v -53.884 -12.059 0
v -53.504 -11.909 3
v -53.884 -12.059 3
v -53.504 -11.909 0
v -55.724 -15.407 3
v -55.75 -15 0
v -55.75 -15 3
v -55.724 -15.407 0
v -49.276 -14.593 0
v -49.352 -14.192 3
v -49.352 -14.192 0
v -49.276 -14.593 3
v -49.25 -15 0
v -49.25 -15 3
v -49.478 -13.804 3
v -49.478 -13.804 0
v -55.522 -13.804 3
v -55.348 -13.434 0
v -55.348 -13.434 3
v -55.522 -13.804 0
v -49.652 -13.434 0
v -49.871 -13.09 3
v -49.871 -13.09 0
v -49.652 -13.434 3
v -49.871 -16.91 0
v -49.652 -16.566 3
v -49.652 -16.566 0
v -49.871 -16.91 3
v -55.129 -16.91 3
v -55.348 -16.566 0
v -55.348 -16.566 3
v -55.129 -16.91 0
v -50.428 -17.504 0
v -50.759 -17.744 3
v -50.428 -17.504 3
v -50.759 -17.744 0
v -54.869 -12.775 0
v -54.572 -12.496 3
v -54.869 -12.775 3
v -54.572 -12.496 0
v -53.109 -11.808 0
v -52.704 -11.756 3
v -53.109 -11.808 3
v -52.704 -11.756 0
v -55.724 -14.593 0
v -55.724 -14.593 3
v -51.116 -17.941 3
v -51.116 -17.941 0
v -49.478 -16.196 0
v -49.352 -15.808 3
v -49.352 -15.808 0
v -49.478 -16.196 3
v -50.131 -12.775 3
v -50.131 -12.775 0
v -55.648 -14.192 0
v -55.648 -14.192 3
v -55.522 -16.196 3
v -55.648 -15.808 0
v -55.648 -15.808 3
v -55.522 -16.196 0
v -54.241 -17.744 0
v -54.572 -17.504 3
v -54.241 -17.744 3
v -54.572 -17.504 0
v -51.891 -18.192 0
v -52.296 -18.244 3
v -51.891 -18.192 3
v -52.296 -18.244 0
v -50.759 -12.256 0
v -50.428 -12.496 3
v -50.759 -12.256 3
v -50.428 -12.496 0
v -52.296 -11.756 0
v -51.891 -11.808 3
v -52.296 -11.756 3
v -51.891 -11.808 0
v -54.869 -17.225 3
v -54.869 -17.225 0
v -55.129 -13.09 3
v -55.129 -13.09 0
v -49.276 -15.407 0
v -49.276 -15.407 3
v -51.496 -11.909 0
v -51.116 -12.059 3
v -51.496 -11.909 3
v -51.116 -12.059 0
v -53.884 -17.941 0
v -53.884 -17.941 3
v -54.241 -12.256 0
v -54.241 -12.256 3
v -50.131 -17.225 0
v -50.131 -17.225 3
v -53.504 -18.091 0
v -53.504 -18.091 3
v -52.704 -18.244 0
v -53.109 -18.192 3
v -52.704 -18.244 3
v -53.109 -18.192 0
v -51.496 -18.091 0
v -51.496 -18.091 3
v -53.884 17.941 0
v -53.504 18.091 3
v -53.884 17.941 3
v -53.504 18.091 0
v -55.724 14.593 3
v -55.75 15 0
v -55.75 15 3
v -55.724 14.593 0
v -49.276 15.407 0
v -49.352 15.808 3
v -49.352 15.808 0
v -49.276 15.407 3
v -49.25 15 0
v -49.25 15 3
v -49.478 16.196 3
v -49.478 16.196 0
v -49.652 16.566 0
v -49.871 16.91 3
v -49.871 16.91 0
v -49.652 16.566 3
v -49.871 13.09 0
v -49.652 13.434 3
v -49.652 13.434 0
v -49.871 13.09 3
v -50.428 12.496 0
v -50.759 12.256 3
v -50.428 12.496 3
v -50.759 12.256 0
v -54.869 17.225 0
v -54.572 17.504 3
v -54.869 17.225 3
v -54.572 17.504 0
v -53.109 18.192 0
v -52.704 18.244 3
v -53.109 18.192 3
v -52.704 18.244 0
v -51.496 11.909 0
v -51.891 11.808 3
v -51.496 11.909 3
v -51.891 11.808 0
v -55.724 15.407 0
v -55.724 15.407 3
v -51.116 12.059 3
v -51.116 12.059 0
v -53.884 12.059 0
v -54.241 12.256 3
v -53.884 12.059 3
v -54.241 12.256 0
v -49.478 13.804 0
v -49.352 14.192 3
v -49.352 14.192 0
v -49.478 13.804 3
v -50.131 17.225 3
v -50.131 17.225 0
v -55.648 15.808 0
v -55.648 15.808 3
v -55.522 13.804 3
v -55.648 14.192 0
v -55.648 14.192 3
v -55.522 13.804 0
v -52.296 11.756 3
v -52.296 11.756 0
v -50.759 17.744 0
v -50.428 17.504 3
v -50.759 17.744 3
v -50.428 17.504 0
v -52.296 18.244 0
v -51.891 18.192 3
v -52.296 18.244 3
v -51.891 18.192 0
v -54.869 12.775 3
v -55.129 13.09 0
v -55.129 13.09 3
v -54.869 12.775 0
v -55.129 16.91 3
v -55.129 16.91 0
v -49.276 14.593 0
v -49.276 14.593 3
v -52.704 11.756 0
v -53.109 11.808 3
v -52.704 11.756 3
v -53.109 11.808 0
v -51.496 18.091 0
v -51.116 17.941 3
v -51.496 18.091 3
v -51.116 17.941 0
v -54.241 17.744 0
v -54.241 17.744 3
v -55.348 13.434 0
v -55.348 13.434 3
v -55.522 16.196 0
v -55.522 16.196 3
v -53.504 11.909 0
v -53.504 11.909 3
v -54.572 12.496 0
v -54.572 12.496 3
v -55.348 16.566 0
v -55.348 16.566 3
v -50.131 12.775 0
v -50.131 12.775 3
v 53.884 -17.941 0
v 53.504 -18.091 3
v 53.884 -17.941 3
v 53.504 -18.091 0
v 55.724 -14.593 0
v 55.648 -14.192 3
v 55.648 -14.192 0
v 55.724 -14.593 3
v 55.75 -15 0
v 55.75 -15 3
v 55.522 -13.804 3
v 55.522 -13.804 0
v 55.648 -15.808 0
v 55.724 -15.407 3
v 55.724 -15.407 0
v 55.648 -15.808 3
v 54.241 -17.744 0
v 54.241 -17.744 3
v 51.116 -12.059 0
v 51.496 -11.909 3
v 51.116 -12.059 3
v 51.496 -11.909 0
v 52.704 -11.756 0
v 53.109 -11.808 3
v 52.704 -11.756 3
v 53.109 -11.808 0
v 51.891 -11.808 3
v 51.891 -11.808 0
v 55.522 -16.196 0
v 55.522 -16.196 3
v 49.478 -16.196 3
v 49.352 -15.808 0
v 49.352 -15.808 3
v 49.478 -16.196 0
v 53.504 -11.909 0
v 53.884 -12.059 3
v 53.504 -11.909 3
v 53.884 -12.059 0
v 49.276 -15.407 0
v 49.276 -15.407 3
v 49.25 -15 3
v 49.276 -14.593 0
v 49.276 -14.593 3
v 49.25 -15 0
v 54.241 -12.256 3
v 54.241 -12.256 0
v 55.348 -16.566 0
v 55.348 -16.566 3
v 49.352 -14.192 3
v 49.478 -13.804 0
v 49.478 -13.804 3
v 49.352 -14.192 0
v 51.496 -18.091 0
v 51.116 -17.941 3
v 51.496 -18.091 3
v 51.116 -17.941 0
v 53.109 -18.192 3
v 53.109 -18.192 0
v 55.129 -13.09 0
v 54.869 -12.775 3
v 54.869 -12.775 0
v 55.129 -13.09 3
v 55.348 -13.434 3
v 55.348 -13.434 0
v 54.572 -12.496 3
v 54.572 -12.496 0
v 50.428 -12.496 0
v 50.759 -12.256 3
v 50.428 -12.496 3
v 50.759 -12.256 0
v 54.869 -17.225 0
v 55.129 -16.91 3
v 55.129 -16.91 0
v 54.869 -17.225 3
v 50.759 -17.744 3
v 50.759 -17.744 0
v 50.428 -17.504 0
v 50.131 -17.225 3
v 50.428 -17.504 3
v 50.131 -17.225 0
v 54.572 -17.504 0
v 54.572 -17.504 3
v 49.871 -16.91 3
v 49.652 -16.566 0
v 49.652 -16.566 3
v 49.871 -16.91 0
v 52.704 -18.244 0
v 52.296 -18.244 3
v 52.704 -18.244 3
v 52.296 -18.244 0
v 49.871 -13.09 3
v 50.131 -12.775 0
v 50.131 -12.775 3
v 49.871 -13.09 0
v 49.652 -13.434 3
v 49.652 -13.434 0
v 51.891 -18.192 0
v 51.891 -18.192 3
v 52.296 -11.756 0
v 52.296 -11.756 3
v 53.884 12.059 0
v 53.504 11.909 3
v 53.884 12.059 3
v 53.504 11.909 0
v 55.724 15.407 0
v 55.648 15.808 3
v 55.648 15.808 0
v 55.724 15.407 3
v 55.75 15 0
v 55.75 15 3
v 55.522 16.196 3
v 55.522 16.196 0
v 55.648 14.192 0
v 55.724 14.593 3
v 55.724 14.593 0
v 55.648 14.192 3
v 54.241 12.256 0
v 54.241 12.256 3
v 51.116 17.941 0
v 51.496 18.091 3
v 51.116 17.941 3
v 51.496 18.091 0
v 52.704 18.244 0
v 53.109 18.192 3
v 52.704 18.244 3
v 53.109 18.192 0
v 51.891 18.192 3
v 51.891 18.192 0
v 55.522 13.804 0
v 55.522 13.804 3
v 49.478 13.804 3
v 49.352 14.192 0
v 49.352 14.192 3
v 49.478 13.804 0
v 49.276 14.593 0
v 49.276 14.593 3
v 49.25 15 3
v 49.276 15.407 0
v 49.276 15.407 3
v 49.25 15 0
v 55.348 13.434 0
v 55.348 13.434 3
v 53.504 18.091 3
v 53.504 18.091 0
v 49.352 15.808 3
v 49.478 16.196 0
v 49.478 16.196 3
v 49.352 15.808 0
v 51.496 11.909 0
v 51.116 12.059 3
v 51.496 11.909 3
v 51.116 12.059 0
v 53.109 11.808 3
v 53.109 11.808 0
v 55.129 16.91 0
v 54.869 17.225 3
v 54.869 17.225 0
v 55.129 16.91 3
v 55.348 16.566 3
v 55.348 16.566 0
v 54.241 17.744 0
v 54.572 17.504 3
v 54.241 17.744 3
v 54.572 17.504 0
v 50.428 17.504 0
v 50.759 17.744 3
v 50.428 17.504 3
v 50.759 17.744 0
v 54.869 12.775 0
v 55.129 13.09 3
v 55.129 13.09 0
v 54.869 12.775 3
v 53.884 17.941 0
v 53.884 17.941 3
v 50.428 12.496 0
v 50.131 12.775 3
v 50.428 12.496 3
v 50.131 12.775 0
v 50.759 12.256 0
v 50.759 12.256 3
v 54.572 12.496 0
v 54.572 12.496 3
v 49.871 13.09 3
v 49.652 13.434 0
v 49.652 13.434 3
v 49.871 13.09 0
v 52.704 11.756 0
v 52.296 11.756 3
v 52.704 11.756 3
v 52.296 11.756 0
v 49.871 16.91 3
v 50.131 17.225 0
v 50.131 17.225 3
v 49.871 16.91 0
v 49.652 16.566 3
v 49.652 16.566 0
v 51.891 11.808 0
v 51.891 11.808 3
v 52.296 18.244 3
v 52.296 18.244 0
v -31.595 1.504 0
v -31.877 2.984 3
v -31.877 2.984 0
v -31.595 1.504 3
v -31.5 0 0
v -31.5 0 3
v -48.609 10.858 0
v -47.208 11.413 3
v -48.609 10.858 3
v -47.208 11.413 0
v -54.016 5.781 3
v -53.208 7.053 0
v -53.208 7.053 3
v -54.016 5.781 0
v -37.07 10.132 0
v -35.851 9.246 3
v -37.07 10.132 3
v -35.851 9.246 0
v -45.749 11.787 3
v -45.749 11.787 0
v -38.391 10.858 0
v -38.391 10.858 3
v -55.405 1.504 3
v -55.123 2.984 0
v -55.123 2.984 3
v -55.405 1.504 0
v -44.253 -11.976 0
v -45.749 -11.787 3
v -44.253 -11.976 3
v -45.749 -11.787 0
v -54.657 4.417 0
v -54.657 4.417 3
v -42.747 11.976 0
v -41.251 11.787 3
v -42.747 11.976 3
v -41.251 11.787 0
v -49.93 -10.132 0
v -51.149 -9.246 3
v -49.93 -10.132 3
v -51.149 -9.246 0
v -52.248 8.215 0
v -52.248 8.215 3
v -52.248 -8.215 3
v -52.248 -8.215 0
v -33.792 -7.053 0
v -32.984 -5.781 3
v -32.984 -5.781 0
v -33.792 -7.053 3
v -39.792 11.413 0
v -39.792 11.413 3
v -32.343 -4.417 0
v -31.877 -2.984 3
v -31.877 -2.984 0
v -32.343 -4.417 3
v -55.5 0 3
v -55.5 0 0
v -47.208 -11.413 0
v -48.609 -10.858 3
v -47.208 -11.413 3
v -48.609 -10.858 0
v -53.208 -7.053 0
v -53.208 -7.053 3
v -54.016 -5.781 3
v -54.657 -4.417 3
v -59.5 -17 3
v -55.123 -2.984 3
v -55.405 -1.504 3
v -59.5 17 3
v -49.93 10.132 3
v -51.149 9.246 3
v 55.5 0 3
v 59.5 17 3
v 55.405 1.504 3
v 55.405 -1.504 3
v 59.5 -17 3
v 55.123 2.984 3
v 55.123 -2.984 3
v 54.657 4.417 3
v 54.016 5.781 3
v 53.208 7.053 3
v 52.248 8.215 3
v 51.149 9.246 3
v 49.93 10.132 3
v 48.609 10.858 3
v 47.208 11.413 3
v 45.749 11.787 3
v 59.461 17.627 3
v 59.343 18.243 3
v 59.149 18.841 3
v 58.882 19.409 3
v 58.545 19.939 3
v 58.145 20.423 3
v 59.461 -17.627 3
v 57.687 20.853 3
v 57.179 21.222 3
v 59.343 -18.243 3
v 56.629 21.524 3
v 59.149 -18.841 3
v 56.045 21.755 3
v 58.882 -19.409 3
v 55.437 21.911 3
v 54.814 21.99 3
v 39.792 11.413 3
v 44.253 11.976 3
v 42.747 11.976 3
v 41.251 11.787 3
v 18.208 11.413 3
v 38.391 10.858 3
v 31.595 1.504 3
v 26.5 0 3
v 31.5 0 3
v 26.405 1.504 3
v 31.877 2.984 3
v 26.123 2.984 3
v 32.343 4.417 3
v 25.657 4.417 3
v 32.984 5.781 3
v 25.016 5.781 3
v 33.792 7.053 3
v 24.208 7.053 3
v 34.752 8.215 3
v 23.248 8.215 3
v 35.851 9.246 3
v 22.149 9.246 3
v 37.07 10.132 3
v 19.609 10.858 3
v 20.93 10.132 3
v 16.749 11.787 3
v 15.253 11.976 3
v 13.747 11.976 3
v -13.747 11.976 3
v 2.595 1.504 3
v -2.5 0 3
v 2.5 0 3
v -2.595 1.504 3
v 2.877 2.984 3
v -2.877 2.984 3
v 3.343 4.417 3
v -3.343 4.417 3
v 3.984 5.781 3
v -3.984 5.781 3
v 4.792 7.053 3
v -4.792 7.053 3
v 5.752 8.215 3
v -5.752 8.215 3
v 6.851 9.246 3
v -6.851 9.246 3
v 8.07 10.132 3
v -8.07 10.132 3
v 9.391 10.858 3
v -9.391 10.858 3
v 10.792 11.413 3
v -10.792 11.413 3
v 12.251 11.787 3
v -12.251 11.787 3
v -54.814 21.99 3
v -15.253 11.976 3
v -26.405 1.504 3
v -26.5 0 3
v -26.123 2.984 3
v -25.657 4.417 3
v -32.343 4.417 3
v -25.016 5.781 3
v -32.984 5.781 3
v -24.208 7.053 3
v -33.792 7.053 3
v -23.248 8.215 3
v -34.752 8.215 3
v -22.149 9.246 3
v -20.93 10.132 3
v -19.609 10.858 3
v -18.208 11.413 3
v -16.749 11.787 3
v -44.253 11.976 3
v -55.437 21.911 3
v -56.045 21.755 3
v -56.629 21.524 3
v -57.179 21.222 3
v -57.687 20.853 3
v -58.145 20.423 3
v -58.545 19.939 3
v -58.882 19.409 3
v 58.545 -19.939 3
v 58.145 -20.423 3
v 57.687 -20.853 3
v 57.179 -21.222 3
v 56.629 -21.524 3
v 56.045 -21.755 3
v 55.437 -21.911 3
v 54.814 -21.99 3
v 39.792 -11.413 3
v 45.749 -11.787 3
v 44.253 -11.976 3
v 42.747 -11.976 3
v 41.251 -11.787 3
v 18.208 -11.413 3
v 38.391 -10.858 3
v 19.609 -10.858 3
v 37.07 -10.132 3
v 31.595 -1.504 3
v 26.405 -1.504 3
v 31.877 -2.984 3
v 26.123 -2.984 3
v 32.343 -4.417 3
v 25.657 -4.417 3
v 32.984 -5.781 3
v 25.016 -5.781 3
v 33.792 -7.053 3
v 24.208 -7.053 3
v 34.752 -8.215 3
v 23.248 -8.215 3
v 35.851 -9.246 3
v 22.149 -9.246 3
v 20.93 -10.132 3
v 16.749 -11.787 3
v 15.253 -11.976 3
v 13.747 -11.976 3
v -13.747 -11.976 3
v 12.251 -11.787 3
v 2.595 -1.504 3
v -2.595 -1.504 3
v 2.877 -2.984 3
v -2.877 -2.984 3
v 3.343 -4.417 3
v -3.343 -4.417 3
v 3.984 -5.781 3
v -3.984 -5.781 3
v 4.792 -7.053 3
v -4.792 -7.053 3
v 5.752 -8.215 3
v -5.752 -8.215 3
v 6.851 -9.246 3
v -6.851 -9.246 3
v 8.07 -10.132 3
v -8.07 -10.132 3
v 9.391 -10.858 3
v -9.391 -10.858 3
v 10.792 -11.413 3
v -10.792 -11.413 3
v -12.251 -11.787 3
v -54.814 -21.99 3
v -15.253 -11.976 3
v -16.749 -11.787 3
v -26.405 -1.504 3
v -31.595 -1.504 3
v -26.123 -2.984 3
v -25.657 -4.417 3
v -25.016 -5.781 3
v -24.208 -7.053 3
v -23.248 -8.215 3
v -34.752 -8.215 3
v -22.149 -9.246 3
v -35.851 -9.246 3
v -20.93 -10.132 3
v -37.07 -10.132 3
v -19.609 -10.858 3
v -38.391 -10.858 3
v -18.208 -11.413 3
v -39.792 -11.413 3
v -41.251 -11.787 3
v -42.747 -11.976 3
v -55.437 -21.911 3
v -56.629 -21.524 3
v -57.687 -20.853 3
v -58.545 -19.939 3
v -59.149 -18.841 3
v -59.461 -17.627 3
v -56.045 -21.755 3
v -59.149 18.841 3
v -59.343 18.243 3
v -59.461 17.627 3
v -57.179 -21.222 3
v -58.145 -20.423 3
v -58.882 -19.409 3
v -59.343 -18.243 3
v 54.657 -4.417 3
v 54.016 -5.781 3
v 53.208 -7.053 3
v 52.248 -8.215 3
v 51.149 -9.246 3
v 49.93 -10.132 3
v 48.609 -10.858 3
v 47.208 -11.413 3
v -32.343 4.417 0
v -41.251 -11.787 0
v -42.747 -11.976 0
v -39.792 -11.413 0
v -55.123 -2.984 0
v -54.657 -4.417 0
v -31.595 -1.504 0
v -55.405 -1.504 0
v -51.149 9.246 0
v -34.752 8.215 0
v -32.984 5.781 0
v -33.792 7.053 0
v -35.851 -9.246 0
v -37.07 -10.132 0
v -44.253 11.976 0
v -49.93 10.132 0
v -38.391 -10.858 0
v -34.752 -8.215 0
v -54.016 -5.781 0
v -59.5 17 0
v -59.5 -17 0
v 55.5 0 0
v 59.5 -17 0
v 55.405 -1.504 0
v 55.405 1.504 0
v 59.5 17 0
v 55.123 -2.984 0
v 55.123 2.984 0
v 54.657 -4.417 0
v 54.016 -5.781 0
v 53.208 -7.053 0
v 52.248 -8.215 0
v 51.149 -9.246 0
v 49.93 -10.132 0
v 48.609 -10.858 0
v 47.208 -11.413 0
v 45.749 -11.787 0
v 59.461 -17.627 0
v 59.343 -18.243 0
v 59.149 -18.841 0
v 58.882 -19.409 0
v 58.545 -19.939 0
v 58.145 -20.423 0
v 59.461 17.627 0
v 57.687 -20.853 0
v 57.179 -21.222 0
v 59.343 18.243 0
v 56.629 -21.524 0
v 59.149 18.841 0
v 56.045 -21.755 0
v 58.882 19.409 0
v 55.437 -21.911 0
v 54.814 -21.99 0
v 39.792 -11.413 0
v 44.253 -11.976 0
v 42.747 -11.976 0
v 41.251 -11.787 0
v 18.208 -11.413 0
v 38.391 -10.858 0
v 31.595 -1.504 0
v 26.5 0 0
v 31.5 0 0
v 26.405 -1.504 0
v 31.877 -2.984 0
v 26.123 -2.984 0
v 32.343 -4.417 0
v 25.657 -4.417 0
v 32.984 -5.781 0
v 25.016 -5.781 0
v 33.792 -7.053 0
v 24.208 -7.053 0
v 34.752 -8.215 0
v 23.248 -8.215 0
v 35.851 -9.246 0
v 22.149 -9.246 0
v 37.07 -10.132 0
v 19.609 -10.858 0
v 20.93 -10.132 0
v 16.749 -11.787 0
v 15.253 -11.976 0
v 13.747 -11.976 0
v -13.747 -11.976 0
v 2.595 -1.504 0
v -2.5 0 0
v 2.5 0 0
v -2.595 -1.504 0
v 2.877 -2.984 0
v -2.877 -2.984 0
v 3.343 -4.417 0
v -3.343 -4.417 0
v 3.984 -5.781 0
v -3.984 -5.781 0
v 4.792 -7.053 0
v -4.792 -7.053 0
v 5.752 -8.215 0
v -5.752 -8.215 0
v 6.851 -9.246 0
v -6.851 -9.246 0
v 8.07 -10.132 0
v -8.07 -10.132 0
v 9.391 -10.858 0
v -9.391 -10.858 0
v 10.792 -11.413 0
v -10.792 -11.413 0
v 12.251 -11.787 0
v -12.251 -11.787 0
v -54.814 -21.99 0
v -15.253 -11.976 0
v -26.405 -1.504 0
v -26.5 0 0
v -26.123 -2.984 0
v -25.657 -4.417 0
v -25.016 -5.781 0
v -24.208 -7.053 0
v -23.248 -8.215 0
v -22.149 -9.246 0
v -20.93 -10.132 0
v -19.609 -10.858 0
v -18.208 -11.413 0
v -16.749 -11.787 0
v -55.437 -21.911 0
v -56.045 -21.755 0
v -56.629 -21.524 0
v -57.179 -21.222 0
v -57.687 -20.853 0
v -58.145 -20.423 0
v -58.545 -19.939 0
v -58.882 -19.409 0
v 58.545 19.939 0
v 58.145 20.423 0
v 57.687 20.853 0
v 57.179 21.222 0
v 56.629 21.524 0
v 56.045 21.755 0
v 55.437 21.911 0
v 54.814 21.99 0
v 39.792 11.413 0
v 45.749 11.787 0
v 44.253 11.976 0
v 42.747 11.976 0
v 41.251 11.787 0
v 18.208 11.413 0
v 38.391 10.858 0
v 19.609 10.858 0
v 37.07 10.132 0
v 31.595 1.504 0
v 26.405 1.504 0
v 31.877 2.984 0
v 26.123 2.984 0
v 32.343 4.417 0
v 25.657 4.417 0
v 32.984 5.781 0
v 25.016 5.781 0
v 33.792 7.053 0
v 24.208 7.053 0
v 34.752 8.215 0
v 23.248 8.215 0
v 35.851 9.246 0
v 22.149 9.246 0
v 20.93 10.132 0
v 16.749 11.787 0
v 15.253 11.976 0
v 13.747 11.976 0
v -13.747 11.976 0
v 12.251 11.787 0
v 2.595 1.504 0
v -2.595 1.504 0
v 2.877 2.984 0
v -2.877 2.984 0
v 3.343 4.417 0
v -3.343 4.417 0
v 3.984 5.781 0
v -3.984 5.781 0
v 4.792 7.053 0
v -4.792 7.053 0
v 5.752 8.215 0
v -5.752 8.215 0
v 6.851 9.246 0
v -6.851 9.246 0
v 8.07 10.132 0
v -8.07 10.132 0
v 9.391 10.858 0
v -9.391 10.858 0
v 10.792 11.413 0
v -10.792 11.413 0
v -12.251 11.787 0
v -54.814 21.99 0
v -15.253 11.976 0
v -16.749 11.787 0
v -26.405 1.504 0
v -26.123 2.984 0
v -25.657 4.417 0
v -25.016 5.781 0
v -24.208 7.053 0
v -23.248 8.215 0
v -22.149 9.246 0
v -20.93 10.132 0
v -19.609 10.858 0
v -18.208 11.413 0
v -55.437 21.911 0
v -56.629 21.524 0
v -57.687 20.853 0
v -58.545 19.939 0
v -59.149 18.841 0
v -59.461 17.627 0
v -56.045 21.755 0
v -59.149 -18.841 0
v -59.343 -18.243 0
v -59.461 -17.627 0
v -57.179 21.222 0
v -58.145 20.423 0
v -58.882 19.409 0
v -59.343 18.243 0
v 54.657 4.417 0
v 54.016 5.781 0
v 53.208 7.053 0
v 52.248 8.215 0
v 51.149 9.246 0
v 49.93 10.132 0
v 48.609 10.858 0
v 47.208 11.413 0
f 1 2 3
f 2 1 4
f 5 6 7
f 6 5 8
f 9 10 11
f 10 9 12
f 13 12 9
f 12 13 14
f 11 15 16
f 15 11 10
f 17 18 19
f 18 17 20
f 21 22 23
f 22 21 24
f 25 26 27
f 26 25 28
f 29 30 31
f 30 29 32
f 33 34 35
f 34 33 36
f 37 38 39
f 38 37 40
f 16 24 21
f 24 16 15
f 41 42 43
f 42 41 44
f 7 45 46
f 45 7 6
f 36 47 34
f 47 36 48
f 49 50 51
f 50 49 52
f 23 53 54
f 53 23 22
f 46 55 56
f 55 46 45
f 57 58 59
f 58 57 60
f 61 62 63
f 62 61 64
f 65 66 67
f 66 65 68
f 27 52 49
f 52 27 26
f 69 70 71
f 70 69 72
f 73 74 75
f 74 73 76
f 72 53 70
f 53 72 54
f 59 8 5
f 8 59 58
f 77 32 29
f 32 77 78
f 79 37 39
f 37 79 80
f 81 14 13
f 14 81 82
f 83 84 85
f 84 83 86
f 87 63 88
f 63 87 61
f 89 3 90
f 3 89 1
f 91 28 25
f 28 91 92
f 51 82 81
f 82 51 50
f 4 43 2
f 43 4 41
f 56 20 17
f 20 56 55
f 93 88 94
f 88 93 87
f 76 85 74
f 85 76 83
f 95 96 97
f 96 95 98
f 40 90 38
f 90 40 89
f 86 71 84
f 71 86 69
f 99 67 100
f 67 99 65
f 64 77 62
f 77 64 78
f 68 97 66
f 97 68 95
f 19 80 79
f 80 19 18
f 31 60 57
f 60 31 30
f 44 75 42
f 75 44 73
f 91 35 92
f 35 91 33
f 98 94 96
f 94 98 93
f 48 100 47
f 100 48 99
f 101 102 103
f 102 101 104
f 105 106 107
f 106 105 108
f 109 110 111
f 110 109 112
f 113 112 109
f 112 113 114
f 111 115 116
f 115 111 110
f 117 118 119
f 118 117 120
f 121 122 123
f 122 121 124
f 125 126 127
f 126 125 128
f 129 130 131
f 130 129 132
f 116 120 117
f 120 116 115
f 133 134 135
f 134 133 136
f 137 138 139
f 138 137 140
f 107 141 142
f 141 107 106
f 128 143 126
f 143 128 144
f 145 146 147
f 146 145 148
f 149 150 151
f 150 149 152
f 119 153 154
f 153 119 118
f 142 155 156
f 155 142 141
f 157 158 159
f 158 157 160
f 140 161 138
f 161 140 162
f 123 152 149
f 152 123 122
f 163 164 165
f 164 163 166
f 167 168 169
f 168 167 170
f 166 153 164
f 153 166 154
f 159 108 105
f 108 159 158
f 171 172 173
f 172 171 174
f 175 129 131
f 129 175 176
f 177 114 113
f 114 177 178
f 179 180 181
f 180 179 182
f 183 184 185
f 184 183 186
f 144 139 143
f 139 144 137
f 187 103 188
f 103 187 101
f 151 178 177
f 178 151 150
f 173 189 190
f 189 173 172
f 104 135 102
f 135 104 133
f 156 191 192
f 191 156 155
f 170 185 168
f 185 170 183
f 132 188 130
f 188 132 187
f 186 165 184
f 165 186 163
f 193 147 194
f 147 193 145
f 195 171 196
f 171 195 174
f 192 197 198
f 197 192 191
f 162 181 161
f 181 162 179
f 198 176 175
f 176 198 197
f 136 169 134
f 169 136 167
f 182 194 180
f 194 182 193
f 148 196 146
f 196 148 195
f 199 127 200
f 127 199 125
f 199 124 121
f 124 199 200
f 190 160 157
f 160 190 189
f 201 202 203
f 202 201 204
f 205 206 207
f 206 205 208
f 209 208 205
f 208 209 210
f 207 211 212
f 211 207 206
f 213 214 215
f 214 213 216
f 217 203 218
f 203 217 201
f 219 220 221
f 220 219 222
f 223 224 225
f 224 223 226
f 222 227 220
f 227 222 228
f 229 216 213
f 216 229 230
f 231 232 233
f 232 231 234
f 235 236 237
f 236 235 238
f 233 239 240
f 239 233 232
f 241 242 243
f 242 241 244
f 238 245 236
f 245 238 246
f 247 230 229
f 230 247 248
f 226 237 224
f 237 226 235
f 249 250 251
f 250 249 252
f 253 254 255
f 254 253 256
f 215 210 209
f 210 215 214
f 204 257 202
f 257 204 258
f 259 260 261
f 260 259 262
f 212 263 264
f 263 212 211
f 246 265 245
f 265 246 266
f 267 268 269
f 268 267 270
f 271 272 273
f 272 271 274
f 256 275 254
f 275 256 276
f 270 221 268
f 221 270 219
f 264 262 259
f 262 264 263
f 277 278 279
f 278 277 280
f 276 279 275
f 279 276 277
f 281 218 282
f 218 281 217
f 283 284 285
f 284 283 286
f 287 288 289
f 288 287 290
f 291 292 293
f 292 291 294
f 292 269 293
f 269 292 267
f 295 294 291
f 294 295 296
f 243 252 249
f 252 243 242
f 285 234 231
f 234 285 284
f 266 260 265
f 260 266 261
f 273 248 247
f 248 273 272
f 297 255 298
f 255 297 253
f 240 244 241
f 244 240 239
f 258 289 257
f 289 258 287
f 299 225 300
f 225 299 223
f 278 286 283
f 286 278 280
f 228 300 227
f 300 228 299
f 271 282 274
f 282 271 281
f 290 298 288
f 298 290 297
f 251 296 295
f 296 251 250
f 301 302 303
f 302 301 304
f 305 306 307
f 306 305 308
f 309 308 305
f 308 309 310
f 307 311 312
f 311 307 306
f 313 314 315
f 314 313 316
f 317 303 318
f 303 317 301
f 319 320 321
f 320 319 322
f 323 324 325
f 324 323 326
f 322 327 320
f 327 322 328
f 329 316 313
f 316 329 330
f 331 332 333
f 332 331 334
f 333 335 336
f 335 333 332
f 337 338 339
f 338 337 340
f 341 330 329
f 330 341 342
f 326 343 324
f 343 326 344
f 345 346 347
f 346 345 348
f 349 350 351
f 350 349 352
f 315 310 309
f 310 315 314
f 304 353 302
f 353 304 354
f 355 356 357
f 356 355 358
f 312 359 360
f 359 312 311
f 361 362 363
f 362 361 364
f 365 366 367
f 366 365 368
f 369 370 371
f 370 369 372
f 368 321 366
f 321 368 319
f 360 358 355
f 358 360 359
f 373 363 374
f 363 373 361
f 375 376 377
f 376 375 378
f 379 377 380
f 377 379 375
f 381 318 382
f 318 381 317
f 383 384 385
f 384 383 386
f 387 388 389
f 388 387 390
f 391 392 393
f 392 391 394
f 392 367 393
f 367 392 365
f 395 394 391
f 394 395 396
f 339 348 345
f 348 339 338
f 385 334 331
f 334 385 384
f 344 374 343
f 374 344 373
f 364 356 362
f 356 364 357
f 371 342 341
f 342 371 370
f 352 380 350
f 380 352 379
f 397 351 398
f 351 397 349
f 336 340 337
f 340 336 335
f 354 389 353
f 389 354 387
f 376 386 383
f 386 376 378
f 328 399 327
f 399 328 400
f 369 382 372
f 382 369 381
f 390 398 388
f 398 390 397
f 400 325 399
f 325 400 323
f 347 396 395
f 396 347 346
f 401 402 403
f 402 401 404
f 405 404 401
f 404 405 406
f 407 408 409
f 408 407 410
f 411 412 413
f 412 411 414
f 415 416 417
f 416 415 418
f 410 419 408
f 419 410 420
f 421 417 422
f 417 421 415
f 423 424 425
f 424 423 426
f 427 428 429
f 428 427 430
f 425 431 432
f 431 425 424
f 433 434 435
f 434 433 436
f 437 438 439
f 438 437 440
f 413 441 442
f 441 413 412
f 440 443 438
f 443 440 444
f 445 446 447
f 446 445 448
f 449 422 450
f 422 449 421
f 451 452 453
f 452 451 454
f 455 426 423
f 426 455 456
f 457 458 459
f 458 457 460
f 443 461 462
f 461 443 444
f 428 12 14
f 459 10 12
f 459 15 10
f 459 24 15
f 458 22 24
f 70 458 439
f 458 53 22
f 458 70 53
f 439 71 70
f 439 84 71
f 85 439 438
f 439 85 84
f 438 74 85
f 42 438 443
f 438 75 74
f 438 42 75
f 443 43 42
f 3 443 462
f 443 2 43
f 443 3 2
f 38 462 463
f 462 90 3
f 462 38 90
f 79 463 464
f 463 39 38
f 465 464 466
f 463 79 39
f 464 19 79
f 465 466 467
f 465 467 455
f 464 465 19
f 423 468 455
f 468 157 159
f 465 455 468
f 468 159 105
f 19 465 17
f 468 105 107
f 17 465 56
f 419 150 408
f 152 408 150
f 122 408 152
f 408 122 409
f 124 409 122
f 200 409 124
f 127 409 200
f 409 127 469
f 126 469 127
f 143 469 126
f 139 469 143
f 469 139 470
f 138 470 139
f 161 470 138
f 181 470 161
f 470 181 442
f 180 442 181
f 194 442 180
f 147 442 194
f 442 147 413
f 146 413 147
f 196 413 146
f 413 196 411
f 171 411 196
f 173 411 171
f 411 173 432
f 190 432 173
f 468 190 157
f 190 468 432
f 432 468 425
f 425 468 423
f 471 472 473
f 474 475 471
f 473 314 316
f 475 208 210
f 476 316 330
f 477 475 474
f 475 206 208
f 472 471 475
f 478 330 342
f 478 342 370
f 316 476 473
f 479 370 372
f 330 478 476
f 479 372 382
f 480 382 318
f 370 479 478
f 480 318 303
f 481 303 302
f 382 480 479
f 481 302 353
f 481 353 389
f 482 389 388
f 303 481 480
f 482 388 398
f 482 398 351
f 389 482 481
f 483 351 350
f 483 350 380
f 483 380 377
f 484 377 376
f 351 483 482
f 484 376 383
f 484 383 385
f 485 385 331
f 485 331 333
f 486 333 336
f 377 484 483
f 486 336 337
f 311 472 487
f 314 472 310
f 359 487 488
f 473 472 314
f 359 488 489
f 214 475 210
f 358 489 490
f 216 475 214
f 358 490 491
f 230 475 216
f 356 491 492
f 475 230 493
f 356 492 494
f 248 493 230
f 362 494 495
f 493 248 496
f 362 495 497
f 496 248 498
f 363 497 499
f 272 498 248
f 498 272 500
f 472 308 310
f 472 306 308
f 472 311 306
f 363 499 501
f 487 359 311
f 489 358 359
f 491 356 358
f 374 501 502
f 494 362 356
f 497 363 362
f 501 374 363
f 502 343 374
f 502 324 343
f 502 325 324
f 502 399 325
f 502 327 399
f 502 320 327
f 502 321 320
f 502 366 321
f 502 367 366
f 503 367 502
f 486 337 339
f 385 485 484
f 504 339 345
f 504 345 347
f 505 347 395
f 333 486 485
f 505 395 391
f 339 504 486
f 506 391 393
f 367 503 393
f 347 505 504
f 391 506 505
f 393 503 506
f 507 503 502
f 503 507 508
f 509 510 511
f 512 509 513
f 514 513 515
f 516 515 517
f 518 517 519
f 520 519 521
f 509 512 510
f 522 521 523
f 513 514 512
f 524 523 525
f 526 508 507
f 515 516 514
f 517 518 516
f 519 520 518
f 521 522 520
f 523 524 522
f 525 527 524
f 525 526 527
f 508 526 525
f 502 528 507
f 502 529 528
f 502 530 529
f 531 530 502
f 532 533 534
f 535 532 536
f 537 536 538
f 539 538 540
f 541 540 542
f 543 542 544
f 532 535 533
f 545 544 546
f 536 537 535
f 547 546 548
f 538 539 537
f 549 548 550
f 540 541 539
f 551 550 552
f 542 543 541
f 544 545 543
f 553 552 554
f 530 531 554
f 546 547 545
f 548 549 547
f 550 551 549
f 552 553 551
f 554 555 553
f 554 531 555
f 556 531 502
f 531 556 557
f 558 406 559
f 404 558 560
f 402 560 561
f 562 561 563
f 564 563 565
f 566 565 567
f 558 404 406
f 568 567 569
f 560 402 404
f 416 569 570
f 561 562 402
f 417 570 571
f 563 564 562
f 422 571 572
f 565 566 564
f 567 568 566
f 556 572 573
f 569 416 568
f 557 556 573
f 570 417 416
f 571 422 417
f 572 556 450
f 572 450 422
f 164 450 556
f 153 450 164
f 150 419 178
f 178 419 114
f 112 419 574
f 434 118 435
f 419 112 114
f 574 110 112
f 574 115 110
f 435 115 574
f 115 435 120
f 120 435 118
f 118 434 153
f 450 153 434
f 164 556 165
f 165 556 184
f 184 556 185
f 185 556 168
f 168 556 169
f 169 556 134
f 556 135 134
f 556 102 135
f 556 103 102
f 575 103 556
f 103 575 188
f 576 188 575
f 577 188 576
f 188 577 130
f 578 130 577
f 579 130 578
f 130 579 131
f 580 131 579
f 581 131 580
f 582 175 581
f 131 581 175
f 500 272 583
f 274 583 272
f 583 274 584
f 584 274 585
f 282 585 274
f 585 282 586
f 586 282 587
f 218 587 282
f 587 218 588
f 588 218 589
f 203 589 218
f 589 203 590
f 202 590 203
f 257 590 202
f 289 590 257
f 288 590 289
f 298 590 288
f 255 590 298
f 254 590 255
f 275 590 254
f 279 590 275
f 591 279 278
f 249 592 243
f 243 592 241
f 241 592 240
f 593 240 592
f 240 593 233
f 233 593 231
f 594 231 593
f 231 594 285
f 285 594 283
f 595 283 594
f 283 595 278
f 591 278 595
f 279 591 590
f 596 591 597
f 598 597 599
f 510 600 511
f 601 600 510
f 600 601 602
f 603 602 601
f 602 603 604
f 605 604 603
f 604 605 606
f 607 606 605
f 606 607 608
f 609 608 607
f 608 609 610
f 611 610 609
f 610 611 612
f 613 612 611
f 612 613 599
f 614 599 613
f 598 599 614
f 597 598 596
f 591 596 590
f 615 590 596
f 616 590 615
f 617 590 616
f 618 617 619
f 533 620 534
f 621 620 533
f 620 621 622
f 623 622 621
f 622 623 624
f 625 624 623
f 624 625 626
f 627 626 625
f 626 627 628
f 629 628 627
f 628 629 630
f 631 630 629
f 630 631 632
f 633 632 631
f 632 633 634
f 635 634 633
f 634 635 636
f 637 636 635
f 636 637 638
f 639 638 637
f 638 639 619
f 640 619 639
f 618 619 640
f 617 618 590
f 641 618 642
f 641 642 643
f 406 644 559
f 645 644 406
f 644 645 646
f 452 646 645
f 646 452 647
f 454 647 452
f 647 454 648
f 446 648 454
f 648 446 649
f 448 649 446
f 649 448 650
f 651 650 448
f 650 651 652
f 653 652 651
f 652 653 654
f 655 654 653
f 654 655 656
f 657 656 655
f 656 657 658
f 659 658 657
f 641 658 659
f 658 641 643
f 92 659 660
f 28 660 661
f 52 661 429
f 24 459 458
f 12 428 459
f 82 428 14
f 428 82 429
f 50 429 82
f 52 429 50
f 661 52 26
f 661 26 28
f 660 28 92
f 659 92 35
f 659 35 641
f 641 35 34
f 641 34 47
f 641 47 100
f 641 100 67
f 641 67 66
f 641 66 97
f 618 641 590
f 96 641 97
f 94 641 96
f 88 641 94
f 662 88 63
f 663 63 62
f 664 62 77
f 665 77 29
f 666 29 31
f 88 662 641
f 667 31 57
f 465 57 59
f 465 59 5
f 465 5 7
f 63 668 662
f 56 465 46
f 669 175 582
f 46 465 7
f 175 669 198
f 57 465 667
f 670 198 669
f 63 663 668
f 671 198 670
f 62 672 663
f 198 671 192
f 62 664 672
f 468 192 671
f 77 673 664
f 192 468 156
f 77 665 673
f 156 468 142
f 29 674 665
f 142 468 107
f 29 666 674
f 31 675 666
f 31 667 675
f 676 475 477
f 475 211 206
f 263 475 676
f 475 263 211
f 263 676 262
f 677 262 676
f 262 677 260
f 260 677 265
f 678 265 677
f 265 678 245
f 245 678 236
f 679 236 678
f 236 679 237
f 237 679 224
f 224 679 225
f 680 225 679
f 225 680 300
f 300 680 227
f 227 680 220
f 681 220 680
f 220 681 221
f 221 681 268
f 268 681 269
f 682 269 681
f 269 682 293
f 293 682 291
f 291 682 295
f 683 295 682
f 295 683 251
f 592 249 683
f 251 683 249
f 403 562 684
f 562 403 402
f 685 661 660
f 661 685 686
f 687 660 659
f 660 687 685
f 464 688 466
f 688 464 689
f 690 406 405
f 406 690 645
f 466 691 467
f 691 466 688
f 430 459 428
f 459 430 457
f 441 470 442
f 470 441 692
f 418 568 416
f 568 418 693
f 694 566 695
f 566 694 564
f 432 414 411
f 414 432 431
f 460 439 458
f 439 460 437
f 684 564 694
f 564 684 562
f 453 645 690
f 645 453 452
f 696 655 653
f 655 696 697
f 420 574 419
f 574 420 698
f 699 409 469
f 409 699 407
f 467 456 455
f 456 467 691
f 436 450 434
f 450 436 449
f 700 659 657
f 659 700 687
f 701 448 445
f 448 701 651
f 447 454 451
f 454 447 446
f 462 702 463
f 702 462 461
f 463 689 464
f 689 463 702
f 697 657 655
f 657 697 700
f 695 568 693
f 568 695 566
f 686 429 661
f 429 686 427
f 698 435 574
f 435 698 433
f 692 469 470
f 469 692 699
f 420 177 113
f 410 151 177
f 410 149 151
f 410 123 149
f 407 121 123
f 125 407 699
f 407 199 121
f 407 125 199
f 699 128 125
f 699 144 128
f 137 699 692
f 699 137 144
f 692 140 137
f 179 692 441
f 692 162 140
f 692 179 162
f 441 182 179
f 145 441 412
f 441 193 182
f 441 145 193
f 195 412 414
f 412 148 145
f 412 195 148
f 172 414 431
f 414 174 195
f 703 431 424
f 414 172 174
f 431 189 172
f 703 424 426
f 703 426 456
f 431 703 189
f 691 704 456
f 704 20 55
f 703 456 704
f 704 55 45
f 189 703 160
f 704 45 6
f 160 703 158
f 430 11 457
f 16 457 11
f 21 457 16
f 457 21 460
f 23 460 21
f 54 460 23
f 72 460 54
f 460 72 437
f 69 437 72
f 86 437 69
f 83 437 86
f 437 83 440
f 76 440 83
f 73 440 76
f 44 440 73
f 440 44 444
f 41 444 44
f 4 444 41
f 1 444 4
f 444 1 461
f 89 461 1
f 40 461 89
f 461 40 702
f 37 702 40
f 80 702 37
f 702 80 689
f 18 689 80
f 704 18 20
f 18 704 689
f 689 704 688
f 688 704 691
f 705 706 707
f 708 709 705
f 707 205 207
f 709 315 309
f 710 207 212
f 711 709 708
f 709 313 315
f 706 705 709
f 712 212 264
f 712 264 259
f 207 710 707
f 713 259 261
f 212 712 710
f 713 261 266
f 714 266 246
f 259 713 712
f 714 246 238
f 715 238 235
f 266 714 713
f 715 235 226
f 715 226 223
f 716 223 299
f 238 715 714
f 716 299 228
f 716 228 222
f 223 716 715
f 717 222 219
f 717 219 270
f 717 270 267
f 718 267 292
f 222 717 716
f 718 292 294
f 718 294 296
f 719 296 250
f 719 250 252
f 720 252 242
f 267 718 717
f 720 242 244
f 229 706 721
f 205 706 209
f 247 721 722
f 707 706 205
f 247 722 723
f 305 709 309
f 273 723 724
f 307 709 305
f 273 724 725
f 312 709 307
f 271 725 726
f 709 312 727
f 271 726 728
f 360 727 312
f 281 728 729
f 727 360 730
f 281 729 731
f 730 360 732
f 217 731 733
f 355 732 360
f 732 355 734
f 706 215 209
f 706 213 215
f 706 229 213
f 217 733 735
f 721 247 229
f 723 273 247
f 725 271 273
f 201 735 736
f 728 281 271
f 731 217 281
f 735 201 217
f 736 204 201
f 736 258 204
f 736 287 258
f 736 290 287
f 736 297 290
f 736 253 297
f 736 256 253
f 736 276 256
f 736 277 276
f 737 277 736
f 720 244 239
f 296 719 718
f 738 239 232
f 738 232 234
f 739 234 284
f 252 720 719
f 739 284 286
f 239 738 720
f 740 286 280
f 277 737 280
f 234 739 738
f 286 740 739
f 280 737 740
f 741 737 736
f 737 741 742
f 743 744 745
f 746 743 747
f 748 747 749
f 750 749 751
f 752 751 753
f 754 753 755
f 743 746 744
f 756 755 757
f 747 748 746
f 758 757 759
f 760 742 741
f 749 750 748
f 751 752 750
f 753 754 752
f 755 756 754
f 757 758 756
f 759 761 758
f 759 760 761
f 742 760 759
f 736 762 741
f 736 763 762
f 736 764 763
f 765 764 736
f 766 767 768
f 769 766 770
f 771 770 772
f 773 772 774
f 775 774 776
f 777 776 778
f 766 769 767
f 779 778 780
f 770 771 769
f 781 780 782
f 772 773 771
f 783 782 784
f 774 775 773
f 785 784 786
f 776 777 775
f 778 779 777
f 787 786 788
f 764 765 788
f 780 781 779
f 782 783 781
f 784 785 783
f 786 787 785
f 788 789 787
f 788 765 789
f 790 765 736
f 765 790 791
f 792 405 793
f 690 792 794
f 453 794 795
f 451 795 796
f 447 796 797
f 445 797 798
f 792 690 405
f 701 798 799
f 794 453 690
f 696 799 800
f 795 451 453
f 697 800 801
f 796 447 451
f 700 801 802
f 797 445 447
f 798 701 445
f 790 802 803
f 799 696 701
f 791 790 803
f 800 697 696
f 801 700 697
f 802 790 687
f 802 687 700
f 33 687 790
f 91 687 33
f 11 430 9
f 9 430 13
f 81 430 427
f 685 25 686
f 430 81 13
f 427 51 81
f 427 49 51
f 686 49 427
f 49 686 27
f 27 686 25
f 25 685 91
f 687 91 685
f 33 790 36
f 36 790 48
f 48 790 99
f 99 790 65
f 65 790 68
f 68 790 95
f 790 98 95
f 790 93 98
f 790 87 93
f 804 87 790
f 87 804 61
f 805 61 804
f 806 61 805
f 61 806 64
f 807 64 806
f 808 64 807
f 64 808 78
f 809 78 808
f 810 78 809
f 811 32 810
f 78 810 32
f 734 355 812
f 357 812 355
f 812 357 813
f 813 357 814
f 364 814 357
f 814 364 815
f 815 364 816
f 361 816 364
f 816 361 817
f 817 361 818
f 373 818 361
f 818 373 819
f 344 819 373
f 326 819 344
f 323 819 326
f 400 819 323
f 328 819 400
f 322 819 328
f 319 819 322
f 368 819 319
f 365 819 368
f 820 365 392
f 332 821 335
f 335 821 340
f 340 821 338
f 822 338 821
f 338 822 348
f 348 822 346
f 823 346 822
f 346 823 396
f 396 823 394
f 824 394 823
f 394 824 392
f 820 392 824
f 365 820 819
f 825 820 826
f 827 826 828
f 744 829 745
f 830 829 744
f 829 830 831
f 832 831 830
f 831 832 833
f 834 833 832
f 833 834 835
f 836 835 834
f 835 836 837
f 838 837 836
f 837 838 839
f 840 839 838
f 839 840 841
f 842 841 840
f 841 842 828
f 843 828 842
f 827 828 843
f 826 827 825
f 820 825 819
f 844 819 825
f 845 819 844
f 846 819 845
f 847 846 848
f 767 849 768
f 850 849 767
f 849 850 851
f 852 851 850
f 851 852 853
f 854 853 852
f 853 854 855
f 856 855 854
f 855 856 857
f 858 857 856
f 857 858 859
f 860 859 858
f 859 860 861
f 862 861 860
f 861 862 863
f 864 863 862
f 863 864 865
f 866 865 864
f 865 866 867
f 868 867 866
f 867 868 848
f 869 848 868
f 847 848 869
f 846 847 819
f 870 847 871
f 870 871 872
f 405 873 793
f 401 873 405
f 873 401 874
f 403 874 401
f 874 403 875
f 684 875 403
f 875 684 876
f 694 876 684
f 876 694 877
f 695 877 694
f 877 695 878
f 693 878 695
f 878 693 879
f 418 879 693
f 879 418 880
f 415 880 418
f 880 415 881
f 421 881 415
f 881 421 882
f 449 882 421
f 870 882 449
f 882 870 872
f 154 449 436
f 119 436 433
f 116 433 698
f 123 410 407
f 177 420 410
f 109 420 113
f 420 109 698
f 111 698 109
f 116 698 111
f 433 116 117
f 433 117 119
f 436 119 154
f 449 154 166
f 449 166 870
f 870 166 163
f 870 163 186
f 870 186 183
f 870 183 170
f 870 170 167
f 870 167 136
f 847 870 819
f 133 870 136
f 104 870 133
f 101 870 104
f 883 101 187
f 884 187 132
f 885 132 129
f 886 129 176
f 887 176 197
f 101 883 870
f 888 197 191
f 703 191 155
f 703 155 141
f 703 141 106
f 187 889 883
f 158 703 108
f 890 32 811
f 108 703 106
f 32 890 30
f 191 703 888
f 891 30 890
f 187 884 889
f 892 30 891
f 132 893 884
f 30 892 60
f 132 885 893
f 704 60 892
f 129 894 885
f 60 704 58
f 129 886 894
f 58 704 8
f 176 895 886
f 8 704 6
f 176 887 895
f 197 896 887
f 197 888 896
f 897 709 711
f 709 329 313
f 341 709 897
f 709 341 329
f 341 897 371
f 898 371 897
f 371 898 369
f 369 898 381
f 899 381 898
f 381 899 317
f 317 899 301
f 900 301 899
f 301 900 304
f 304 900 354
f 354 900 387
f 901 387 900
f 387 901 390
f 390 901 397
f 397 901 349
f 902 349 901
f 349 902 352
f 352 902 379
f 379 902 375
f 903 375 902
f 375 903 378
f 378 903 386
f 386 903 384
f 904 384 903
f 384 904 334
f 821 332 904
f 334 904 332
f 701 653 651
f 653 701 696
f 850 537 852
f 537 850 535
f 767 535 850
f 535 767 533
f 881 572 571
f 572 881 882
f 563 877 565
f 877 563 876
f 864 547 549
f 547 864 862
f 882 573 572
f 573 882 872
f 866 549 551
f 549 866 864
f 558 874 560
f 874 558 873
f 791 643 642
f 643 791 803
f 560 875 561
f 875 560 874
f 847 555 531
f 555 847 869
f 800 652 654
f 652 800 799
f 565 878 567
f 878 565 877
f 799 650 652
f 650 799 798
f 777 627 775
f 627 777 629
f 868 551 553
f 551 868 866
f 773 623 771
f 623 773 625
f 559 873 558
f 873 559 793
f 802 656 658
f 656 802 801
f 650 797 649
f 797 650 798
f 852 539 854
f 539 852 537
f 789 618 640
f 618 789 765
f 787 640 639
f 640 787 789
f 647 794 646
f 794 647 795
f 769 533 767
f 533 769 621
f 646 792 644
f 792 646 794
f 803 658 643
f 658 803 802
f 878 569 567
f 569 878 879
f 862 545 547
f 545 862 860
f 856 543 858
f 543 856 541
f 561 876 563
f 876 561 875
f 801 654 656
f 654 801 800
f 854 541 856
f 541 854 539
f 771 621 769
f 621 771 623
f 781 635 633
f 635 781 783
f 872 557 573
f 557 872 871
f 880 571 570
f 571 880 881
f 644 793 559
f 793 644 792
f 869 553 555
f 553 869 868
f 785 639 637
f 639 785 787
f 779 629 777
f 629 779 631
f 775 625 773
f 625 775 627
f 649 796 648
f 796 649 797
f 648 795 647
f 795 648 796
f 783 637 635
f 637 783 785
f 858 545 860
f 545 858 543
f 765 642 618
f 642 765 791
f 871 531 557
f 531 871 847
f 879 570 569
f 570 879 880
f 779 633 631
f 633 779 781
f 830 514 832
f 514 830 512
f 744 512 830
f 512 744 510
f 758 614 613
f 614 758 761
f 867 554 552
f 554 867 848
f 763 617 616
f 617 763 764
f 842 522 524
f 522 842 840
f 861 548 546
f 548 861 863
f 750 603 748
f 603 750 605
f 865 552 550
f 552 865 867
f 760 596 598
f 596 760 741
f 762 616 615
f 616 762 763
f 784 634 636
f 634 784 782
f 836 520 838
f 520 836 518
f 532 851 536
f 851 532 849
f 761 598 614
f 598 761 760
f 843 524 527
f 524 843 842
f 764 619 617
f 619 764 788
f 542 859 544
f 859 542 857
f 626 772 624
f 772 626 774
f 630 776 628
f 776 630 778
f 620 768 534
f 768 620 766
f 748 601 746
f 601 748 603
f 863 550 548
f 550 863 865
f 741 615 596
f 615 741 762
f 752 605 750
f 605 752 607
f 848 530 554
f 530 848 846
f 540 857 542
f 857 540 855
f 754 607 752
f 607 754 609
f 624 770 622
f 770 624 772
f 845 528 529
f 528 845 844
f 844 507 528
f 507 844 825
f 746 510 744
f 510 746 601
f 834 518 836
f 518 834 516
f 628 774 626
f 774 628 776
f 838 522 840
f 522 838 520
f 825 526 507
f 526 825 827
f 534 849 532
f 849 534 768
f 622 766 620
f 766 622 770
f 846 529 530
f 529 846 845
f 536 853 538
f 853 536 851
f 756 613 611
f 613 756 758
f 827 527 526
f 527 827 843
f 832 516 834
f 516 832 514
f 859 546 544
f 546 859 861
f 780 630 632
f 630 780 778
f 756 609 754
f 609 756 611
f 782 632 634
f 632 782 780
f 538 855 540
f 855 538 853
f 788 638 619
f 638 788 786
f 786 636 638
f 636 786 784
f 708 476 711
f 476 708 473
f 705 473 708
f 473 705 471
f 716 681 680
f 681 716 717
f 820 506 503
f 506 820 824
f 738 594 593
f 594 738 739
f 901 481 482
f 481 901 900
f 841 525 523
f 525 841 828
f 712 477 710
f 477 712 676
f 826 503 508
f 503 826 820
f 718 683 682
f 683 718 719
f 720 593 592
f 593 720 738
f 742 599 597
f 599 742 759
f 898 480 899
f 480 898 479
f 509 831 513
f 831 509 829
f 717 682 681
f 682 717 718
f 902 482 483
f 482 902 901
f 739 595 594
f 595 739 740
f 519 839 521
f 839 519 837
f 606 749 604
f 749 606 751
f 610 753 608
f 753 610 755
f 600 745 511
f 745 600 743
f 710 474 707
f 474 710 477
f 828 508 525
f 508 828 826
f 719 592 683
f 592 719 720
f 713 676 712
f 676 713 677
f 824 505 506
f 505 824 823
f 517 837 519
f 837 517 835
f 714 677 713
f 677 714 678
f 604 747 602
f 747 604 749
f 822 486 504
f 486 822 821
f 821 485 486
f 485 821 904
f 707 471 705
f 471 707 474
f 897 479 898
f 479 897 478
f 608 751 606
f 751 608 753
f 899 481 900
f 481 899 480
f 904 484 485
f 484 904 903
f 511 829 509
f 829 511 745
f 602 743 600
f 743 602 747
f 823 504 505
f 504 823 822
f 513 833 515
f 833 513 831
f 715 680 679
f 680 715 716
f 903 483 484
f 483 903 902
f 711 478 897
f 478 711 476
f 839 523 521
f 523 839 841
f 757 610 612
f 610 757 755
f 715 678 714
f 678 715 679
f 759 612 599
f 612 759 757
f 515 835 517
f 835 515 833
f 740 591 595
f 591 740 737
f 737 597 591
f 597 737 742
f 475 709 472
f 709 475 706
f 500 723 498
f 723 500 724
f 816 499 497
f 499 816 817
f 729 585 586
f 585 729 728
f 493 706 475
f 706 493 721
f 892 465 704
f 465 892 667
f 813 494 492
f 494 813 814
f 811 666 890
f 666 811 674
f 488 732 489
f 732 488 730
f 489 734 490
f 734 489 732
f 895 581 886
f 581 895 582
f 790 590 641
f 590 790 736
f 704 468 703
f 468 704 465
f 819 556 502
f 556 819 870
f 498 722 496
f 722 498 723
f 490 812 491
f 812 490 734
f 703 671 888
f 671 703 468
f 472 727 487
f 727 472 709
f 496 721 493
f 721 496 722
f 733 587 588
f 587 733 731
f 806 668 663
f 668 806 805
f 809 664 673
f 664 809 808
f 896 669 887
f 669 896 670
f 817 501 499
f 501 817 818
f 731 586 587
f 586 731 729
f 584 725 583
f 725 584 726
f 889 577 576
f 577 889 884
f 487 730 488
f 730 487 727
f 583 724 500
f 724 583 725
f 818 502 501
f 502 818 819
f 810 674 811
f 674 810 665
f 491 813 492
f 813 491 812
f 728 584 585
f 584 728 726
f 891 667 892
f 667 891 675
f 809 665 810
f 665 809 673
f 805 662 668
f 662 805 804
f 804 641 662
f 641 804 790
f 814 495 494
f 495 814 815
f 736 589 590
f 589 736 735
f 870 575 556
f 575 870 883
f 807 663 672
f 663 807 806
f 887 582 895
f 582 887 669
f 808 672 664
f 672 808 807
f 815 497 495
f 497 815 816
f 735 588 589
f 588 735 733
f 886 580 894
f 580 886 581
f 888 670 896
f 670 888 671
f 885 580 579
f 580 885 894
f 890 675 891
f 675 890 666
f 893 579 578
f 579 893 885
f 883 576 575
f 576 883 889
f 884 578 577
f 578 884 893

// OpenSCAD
$fn = 50;


difference() {
	union() {
		hull() {
			translate(v = [-54.5000000000, 17.0000000000, 0]) {
				cylinder(h = 3, r = 5);
			}
			translate(v = [54.5000000000, 17.0000000000, 0]) {
				cylinder(h = 3, r = 5);
			}
			translate(v = [-54.5000000000, -17.0000000000, 0]) {
				cylinder(h = 3, r = 5);
			}
			translate(v = [54.5000000000, -17.0000000000, 0]) {
				cylinder(h = 3, r = 5);
			}
		}
	}
	union() {
		#translate(v = [-52.5000000000, -15.0000000000, -100.0000000000]) {
			cylinder(h = 200, r = 3.2500000000);
		}
		#translate(v = [-52.5000000000, 15.0000000000, -100.0000000000]) {
			cylinder(h = 200, r = 3.2500000000);
		}
		#translate(v = [52.5000000000, -15.0000000000, -100.0000000000]) {
			cylinder(h = 200, r = 3.2500000000);
		}
		#translate(v = [52.5000000000, 15.0000000000, -100.0000000000]) {
			cylinder(h = 200, r = 3.2500000000);
		}
		#translate(v = [-43.5000000000, 0, 0]) {
			cylinder(h = 3, r = 12.0000000000);
		}
		#translate(v = [-14.5000000000, 0, 0]) {
			cylinder(h = 3, r = 12.0000000000);
		}
		#translate(v = [14.5000000000, 0, 0]) {
			cylinder(h = 3, r = 12.0000000000);
		}
		#translate(v = [43.5000000000, 0, 0]) {
			cylinder(h = 3, r = 12.0000000000);
		}
	}
}
